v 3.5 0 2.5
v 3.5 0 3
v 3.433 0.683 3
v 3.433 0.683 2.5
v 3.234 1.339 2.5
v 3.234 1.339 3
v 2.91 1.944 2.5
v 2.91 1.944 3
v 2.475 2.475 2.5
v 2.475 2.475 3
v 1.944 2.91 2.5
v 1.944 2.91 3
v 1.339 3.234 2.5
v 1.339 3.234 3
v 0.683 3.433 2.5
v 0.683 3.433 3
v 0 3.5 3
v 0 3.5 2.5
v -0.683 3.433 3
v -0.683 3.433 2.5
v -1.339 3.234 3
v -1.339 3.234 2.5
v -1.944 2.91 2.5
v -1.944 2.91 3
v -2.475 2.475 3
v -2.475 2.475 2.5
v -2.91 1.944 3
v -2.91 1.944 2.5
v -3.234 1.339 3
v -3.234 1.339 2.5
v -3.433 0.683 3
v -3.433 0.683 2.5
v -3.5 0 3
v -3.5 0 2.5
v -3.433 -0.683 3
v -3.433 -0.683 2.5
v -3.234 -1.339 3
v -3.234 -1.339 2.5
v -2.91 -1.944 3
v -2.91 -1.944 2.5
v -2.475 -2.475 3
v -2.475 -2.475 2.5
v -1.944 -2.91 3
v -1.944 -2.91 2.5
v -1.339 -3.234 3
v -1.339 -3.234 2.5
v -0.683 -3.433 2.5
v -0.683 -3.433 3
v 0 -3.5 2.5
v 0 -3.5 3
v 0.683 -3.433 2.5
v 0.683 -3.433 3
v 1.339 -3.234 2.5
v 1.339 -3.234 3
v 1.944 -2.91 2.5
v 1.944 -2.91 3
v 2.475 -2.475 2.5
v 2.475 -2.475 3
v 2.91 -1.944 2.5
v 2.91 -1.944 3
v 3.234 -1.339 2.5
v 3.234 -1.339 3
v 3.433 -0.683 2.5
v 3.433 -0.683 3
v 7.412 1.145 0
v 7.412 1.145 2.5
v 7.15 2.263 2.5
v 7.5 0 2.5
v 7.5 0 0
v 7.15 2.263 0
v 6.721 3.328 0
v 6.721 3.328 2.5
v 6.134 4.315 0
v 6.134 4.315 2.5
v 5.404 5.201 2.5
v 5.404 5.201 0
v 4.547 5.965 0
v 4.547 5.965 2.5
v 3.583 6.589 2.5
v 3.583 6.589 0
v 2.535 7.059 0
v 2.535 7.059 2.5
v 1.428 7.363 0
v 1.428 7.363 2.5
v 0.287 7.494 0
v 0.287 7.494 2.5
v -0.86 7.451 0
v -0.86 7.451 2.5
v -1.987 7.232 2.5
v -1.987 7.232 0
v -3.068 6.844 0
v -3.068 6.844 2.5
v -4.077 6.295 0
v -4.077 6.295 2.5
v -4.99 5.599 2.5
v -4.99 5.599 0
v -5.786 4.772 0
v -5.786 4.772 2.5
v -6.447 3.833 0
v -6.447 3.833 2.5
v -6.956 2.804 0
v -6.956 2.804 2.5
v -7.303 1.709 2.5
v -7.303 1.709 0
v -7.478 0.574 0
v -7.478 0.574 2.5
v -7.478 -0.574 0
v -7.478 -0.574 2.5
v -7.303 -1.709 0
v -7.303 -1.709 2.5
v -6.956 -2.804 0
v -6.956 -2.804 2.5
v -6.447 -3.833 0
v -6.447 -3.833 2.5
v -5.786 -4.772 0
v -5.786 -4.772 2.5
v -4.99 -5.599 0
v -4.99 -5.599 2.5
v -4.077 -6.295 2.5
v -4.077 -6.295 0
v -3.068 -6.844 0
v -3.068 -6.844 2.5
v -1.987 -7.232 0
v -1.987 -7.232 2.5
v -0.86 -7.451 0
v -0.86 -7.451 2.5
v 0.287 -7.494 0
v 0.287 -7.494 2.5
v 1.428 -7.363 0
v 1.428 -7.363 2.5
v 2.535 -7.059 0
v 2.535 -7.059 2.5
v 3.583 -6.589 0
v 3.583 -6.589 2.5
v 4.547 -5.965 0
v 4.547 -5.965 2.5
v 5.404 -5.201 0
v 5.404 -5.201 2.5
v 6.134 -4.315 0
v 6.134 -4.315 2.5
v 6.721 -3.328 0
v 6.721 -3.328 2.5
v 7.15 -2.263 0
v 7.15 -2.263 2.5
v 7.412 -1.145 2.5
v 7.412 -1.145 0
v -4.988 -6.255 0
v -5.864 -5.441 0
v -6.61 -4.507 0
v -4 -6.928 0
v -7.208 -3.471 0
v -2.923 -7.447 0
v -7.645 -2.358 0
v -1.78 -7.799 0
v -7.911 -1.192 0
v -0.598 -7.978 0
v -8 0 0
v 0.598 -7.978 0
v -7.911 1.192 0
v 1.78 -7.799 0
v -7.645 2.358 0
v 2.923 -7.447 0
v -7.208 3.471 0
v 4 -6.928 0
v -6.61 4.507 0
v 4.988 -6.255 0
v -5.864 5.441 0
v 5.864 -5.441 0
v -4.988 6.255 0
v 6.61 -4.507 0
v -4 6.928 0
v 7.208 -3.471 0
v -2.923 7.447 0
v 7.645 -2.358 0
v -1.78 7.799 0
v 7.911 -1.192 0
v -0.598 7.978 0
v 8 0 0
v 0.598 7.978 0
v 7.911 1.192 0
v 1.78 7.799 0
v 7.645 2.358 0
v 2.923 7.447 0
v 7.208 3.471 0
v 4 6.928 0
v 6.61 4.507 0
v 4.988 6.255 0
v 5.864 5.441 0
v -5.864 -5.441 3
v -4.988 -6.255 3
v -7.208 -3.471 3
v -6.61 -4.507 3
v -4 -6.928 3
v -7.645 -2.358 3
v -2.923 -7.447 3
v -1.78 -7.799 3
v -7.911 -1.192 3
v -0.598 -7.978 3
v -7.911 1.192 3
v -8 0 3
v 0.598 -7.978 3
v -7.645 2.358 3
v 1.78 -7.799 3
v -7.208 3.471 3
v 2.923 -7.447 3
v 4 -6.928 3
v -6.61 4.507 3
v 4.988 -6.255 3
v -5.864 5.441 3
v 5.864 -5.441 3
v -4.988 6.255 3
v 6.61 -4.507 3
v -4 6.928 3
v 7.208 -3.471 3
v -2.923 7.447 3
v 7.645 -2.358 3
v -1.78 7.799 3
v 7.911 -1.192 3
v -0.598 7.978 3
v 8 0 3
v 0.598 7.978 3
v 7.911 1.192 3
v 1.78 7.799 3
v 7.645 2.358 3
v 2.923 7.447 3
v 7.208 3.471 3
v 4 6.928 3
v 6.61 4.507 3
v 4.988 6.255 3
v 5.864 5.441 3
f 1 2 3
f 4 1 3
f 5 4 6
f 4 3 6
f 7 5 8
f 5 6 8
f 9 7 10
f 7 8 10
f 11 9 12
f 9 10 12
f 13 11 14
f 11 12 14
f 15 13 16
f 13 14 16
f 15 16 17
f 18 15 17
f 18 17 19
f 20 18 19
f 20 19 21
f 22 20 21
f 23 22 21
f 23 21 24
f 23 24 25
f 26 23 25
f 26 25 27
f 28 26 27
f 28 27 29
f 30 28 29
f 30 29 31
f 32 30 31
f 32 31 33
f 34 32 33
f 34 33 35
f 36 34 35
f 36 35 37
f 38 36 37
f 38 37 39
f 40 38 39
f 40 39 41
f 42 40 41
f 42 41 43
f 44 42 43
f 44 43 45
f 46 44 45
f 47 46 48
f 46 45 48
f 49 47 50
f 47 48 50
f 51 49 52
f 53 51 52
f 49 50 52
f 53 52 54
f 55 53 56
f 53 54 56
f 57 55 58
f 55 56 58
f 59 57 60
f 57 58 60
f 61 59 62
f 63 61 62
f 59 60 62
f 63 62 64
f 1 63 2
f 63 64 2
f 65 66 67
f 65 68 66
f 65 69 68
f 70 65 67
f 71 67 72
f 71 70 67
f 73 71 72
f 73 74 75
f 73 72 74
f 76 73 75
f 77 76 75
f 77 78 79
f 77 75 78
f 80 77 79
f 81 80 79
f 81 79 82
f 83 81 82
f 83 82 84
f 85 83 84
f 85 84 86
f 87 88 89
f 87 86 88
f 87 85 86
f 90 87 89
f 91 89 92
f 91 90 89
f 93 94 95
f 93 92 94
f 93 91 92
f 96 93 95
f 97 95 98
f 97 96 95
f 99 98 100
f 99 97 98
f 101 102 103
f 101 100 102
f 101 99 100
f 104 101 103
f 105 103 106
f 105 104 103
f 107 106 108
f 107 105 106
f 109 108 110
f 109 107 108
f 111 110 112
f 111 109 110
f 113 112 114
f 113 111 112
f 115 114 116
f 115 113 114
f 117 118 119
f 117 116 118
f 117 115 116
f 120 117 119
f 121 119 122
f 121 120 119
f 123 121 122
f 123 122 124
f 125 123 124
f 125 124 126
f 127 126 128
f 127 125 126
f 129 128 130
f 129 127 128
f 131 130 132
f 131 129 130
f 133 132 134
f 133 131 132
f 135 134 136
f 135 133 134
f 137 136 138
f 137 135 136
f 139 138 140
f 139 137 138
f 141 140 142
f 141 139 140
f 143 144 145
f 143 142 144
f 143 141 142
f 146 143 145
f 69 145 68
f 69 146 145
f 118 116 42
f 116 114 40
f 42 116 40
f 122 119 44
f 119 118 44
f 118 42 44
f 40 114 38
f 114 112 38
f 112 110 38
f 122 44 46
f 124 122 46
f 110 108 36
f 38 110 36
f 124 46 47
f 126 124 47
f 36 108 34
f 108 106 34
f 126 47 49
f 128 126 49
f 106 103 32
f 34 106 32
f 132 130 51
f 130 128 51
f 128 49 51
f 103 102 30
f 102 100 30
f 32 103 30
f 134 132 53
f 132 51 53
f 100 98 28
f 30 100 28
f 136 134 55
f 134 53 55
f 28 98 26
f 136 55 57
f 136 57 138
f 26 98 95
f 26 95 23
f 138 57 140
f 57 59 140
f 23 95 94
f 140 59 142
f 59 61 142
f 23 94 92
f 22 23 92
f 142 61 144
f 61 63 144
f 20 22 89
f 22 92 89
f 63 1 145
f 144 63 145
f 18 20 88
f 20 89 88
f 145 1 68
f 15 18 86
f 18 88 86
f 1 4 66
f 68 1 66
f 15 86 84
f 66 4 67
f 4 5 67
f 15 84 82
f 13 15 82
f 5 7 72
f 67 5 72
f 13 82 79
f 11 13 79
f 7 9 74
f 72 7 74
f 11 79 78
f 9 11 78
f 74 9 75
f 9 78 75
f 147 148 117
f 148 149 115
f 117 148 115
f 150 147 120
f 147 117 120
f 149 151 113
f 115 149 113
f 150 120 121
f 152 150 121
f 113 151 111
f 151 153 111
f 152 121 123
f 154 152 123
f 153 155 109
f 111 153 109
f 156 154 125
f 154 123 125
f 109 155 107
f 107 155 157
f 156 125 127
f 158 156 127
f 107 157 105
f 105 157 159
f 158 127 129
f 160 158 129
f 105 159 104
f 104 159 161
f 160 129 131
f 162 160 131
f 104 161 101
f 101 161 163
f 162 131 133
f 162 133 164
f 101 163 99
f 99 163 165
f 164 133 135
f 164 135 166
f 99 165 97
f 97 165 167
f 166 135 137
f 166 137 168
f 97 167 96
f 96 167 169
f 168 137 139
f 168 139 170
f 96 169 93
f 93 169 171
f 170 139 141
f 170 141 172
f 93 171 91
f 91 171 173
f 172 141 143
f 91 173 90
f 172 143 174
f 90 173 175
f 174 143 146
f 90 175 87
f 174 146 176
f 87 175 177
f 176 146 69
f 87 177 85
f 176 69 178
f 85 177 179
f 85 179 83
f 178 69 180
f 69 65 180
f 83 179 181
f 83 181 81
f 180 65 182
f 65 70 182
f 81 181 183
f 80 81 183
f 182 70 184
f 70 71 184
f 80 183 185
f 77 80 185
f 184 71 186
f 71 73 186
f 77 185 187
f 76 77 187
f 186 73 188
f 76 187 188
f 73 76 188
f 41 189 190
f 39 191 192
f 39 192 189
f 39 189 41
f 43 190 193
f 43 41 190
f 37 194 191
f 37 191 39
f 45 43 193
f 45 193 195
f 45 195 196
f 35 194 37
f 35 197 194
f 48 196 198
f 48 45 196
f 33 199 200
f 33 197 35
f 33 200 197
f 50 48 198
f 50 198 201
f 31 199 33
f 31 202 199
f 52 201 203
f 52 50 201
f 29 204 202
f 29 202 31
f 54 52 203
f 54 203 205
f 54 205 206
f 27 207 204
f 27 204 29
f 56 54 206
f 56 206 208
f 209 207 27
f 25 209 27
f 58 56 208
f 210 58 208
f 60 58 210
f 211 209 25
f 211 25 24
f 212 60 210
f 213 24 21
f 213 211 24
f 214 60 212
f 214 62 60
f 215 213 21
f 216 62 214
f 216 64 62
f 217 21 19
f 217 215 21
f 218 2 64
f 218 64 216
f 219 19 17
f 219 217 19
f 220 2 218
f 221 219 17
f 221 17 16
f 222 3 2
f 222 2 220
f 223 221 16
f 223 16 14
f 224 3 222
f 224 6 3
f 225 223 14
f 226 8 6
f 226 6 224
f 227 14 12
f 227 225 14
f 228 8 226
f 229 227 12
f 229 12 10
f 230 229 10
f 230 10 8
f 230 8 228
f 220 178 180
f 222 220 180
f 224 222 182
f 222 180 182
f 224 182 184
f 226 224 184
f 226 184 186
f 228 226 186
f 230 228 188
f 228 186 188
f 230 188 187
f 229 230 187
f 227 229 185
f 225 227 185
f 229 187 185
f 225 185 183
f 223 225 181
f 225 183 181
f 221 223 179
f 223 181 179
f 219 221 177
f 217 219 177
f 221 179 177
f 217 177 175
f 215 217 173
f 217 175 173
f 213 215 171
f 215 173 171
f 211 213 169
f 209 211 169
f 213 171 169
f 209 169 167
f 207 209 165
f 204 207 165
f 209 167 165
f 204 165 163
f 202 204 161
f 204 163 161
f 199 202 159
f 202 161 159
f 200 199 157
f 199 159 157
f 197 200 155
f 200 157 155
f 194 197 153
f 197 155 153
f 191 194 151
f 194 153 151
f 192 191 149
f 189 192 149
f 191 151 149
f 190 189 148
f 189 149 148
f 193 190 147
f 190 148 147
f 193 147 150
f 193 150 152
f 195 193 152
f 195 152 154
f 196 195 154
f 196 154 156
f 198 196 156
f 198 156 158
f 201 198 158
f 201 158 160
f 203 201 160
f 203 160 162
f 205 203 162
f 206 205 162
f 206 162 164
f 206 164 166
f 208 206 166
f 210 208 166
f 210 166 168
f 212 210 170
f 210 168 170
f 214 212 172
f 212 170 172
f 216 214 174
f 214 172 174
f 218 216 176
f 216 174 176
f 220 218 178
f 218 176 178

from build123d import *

# Parameters (mm, degrees)
SKETCH_1_R          = 8
EXTRUDE_1_DEPTH     = 3
SHELL_2_T           = -0.5
SKETCH_2_R          = 3.5
CUT_EXTRUDE_2_DEPTH = 12.704699911


with BuildPart() as part:
    # 草图1 → 拉伸1 (new body)
    with BuildSketch(Plane.XY):
        Circle(SKETCH_1_R)
    extrude(amount=EXTRUDE_1_DEPTH)

    # 抽壳2
    shell_2_openings = [part.faces().sort_by_distance(p)[0] for p in [
        (0, 0, 0),
    ]]
    offset(amount=SHELL_2_T, openings=shell_2_openings, kind=Kind.INTERSECTION)

    # 草图2 → 拉伸2 (cut, through all)
    with BuildSketch(Plane.XY.offset(3)):
        Circle(SKETCH_2_R)
    extrude(amount=-CUT_EXTRUDE_2_DEPTH, mode=Mode.SUBTRACT)


solid = part.part
